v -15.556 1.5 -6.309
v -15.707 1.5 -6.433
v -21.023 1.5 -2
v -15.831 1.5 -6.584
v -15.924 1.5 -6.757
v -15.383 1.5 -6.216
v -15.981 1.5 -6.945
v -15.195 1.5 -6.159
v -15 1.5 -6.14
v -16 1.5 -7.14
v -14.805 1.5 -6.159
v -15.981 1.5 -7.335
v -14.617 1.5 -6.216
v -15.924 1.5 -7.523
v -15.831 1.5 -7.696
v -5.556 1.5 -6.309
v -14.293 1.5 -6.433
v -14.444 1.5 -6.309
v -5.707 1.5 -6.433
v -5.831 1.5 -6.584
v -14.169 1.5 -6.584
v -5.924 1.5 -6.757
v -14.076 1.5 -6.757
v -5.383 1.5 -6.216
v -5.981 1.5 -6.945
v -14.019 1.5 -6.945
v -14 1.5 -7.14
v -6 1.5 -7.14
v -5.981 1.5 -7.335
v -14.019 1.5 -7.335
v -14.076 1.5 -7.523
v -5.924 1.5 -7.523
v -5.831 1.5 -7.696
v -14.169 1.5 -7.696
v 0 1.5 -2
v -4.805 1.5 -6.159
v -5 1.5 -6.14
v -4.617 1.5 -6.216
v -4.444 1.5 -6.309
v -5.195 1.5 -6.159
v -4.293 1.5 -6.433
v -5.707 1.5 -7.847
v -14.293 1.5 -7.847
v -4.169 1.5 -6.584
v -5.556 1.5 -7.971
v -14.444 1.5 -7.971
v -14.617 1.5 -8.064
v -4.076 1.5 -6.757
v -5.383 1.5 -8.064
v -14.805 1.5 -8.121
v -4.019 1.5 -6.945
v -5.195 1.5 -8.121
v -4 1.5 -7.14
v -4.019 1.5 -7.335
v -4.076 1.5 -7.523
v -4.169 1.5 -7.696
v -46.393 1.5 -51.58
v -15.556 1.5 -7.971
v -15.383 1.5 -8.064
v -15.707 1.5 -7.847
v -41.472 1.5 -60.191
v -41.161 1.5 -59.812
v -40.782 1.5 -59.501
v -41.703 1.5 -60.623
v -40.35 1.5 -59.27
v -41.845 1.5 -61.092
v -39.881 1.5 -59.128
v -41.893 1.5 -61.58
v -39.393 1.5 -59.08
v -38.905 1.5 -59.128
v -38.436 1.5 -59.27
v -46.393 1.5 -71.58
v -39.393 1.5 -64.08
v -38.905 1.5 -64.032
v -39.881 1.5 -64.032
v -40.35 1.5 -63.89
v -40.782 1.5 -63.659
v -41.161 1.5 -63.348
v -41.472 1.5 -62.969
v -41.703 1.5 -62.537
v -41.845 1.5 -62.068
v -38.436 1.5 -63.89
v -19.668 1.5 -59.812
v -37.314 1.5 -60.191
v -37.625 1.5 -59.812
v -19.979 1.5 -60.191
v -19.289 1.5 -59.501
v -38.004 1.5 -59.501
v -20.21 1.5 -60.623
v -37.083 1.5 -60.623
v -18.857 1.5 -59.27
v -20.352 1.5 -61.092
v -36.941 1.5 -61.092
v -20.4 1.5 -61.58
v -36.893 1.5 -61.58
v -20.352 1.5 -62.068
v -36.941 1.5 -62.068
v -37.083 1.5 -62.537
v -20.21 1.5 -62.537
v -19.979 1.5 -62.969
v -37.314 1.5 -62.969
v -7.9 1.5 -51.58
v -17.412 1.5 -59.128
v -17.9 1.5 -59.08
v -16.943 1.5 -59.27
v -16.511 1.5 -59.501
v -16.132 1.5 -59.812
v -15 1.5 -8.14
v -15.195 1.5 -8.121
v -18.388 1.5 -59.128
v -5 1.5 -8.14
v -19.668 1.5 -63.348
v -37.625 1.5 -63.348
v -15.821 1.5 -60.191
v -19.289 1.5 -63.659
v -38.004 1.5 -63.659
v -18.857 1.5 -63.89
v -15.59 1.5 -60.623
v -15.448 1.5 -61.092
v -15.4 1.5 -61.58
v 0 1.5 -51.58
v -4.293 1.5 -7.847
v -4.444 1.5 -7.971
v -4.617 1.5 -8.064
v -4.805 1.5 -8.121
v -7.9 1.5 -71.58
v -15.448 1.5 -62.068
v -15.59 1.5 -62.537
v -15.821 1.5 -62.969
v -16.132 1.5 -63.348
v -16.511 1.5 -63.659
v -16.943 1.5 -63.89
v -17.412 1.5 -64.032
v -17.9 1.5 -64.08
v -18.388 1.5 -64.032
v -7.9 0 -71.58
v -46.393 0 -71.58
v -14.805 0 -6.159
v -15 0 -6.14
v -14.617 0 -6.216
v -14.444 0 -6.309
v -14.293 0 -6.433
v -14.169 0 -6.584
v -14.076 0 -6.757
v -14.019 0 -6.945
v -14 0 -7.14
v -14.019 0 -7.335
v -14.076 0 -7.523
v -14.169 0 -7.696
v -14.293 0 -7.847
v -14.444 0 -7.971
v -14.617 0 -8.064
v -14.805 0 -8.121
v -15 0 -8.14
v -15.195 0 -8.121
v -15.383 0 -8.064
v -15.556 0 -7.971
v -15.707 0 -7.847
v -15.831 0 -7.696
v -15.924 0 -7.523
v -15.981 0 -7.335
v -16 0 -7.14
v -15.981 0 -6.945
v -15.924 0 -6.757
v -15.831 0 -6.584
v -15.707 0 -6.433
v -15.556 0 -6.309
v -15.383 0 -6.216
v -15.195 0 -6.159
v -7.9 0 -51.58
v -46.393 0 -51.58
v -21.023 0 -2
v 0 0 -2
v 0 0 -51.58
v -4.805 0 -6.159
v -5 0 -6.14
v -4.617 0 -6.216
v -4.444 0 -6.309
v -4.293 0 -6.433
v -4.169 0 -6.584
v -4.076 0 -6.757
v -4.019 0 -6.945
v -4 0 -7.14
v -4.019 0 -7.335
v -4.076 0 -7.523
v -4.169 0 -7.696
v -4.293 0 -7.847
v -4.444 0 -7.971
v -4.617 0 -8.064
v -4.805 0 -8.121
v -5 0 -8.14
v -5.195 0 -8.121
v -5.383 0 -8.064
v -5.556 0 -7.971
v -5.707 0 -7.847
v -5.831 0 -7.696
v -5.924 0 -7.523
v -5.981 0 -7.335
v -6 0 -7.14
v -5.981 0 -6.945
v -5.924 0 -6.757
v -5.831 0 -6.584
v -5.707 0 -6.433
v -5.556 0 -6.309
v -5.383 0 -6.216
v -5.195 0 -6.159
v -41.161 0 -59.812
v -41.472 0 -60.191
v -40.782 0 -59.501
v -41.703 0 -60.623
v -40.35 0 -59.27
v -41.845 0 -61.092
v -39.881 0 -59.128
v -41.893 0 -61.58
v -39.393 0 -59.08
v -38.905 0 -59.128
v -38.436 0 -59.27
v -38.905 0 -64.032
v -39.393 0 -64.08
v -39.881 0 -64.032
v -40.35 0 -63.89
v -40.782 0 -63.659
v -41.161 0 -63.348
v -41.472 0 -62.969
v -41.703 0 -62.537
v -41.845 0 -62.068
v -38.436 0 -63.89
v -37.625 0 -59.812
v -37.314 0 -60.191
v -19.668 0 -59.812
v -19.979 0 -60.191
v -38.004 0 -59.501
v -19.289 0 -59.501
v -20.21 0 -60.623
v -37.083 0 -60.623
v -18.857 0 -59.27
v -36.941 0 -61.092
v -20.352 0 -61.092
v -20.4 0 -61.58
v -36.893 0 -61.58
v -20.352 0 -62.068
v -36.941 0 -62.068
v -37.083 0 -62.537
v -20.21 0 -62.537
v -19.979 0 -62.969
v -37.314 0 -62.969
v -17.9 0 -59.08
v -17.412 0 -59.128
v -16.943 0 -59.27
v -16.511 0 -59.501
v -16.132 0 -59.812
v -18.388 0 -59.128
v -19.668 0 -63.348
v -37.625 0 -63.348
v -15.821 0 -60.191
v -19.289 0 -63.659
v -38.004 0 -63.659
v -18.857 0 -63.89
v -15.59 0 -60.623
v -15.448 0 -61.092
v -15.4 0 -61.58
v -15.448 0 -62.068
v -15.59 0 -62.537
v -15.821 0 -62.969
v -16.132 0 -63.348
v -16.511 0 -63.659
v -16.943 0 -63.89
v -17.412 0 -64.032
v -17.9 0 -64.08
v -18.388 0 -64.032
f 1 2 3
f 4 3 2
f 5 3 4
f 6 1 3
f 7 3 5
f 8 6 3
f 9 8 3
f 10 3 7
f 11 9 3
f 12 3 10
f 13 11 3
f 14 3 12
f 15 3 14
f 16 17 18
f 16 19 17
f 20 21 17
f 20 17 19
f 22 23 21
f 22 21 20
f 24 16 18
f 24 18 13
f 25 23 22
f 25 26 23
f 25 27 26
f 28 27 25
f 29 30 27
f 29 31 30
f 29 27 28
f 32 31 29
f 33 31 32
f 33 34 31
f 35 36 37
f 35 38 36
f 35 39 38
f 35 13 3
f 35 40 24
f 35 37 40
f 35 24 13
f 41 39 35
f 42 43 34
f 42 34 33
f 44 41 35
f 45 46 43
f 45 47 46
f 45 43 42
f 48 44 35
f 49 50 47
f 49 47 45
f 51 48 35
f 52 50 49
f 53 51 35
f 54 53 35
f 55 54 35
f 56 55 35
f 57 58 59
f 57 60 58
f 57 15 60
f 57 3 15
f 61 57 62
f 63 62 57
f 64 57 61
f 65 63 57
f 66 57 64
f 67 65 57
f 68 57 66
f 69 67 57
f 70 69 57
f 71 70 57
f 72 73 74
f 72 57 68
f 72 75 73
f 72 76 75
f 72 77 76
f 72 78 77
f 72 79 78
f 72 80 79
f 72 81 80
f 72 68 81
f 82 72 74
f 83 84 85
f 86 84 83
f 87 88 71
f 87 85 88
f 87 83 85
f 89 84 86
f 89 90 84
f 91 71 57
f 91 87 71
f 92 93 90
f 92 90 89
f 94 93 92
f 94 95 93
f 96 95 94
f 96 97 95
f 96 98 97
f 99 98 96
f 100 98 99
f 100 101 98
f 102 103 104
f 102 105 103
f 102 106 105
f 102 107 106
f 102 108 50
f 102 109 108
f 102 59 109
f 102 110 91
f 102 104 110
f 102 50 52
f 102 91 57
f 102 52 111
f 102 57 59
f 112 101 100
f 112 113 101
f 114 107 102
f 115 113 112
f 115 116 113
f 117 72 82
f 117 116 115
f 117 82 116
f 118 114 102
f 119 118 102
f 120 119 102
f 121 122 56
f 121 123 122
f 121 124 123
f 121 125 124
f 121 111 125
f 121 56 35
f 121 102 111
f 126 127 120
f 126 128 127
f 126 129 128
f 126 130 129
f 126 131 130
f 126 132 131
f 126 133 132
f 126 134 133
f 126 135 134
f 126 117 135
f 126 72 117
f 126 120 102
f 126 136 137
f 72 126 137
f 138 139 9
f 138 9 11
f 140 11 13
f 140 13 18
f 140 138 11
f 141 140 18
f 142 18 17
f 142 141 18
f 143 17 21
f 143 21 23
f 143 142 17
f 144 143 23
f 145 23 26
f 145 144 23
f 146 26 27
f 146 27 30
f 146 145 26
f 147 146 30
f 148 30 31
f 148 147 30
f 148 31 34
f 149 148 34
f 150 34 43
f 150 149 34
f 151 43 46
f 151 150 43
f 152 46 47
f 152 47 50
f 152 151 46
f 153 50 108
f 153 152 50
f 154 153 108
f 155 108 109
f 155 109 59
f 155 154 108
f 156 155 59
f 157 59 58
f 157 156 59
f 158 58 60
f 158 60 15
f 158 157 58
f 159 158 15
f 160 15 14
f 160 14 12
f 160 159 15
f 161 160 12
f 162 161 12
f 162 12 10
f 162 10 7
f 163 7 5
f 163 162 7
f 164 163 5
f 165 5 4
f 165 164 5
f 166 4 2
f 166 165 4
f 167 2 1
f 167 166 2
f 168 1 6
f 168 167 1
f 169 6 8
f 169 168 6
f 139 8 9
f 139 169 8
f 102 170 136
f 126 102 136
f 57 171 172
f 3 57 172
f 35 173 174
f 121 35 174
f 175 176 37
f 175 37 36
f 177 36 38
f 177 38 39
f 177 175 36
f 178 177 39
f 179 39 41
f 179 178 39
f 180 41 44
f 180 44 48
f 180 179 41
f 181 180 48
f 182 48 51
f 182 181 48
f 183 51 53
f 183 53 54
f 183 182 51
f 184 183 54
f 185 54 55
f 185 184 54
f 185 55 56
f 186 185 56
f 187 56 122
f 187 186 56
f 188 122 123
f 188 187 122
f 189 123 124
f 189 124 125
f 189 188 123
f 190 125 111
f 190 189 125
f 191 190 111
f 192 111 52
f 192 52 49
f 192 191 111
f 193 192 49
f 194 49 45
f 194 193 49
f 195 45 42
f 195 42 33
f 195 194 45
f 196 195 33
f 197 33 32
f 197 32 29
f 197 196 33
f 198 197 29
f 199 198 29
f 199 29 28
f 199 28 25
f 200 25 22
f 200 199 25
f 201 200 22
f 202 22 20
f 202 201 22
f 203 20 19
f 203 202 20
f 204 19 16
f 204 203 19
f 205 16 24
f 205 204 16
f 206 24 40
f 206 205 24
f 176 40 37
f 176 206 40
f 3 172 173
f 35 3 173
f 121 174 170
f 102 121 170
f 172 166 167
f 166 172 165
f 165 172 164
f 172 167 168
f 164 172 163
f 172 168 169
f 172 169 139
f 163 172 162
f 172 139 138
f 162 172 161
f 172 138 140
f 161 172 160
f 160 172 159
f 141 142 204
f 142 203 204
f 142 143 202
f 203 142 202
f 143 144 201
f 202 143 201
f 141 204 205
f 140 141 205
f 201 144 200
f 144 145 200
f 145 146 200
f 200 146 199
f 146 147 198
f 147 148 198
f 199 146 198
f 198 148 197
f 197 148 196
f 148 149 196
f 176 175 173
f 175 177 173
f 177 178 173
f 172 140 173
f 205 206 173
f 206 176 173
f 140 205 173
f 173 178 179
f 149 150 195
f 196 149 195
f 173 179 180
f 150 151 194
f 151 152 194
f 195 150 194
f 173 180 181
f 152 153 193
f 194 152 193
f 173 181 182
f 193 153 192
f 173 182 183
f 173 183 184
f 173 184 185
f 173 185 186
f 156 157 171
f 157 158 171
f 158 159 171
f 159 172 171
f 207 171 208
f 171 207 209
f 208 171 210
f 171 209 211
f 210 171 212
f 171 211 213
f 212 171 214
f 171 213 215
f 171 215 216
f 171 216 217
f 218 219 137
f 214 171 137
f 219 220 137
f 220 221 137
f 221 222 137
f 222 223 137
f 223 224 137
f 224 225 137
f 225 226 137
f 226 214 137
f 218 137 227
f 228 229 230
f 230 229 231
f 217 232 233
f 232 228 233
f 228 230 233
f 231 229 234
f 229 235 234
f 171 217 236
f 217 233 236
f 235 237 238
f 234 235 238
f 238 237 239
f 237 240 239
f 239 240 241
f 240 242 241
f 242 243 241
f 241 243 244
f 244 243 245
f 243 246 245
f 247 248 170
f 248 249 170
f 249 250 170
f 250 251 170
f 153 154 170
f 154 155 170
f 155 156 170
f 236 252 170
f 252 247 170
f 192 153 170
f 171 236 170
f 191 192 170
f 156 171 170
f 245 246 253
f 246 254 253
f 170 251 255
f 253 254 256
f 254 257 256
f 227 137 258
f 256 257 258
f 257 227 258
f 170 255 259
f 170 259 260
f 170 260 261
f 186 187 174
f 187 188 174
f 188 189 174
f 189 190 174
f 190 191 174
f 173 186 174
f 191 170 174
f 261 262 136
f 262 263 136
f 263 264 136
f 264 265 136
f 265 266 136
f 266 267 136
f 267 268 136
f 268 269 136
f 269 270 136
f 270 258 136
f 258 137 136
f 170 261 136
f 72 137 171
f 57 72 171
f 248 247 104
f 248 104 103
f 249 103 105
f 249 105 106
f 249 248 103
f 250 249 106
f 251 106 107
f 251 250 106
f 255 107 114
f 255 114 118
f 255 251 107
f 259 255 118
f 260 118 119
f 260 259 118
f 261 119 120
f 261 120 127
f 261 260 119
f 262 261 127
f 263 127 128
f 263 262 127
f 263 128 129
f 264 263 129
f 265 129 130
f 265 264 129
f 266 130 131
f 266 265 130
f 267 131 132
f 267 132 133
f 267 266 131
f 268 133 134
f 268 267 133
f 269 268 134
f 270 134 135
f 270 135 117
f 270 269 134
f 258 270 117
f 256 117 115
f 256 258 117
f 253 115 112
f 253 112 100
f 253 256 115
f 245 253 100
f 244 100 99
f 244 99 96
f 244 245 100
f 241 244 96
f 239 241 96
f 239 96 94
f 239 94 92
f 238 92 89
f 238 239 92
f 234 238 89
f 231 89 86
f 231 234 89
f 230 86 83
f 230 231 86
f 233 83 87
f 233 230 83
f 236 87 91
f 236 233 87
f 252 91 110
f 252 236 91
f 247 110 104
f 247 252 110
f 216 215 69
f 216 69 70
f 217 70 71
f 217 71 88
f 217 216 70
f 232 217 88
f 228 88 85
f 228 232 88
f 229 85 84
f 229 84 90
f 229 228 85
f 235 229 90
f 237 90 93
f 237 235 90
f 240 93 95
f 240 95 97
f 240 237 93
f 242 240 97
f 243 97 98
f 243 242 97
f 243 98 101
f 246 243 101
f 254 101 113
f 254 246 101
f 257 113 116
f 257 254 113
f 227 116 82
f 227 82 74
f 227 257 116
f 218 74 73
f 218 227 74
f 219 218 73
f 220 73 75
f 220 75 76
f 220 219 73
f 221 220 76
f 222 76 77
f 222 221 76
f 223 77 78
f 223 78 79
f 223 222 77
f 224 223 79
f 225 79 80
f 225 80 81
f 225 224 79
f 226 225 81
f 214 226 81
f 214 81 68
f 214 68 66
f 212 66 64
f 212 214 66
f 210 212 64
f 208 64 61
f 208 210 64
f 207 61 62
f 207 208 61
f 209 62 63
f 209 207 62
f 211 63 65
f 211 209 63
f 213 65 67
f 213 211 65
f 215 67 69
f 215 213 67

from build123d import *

# Parameters (mm, degrees)
SKETCH1_R           = 2.5
SKETCH1_R_2         = 1
BOSS_EXTRUDE1_DEPTH = 1.5


with BuildPart() as part:
    # Sketch1 → Boss-Extrude1 (new body)
    with BuildSketch(Plane(origin=(0, 0, 0), x_dir=(1, 0, 0), z_dir=(0, 1, 0))):
        Polygon((-7.9, 71.58), (-46.39309335, 71.58), (-46.39309335, 51.58), (-21.023384775, 2), (0, 2), (0, 51.58), (-7.9, 51.58), align=None)
        with Locations(Location((-17.9, 61.58, 0), (0, 0, 270))):
            Circle(SKETCH1_R, mode=Mode.SUBTRACT)
        with Locations(Location((-39.39309335, 61.58, 0), (0, 0, 270))):
            Circle(SKETCH1_R, mode=Mode.SUBTRACT)
        with Locations(Location((-5, 7.14, 0), (0, 0, 270))):
            Circle(SKETCH1_R_2, mode=Mode.SUBTRACT)
        with Locations(Location((-15, 7.14, 0), (0, 0, 270))):
            Circle(SKETCH1_R_2, mode=Mode.SUBTRACT)
    extrude(amount=BOSS_EXTRUDE1_DEPTH)


solid = part.part
